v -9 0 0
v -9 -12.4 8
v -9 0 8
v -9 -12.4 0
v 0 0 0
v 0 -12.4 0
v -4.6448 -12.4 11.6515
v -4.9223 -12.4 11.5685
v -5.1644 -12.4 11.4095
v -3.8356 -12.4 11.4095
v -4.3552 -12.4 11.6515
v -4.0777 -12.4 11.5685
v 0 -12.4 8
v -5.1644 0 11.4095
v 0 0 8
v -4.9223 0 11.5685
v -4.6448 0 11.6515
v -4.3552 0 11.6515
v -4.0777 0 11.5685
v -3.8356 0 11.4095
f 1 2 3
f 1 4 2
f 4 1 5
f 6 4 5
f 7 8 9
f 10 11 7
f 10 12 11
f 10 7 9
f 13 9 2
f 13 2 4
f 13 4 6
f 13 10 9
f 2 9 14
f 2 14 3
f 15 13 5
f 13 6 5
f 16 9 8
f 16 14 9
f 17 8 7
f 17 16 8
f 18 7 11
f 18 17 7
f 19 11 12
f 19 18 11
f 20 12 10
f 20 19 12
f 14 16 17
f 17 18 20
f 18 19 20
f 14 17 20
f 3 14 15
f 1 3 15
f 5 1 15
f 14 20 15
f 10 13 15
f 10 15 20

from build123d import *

# Parameters (mm, degrees)
F0_W     = 9
F0_H     = 12.4
F1_DEPTH = 4
F2_W     = 9
F2_H     = 12.4
F3_DEPTH = 4
F5_DEPTH = 12.4
F6_R     = 1


with BuildPart() as f1:
    # F0 (on Top) → F1 (new body)
    with BuildSketch(Plane.XY):
        with Locations((-4.5, -6.2)):
            Rectangle(F0_W, F0_H)
    extrude(amount=F1_DEPTH)

    # F2 (on face) → F3 (join)
    with BuildSketch(Plane.XY.offset(4)):
        with Locations((-4.5, -6.2)):
            Rectangle(F2_W, F2_H)
    extrude(amount=F3_DEPTH)

    # F4 (on face) → F5 (join, through all)
    with BuildSketch(Plane.XZ.offset(12.4)):
        Polygon((-4.5, 12), (-9, 8), (0, 8), align=None)
    extrude(amount=-F5_DEPTH)

    # F6
    f6_edges = [f1.edges().sort_by_distance(p)[0] for p in [
        (-4.5, -6.2, 12),
    ]]
    fillet(f6_edges, radius=F6_R)


solid = f1.part
